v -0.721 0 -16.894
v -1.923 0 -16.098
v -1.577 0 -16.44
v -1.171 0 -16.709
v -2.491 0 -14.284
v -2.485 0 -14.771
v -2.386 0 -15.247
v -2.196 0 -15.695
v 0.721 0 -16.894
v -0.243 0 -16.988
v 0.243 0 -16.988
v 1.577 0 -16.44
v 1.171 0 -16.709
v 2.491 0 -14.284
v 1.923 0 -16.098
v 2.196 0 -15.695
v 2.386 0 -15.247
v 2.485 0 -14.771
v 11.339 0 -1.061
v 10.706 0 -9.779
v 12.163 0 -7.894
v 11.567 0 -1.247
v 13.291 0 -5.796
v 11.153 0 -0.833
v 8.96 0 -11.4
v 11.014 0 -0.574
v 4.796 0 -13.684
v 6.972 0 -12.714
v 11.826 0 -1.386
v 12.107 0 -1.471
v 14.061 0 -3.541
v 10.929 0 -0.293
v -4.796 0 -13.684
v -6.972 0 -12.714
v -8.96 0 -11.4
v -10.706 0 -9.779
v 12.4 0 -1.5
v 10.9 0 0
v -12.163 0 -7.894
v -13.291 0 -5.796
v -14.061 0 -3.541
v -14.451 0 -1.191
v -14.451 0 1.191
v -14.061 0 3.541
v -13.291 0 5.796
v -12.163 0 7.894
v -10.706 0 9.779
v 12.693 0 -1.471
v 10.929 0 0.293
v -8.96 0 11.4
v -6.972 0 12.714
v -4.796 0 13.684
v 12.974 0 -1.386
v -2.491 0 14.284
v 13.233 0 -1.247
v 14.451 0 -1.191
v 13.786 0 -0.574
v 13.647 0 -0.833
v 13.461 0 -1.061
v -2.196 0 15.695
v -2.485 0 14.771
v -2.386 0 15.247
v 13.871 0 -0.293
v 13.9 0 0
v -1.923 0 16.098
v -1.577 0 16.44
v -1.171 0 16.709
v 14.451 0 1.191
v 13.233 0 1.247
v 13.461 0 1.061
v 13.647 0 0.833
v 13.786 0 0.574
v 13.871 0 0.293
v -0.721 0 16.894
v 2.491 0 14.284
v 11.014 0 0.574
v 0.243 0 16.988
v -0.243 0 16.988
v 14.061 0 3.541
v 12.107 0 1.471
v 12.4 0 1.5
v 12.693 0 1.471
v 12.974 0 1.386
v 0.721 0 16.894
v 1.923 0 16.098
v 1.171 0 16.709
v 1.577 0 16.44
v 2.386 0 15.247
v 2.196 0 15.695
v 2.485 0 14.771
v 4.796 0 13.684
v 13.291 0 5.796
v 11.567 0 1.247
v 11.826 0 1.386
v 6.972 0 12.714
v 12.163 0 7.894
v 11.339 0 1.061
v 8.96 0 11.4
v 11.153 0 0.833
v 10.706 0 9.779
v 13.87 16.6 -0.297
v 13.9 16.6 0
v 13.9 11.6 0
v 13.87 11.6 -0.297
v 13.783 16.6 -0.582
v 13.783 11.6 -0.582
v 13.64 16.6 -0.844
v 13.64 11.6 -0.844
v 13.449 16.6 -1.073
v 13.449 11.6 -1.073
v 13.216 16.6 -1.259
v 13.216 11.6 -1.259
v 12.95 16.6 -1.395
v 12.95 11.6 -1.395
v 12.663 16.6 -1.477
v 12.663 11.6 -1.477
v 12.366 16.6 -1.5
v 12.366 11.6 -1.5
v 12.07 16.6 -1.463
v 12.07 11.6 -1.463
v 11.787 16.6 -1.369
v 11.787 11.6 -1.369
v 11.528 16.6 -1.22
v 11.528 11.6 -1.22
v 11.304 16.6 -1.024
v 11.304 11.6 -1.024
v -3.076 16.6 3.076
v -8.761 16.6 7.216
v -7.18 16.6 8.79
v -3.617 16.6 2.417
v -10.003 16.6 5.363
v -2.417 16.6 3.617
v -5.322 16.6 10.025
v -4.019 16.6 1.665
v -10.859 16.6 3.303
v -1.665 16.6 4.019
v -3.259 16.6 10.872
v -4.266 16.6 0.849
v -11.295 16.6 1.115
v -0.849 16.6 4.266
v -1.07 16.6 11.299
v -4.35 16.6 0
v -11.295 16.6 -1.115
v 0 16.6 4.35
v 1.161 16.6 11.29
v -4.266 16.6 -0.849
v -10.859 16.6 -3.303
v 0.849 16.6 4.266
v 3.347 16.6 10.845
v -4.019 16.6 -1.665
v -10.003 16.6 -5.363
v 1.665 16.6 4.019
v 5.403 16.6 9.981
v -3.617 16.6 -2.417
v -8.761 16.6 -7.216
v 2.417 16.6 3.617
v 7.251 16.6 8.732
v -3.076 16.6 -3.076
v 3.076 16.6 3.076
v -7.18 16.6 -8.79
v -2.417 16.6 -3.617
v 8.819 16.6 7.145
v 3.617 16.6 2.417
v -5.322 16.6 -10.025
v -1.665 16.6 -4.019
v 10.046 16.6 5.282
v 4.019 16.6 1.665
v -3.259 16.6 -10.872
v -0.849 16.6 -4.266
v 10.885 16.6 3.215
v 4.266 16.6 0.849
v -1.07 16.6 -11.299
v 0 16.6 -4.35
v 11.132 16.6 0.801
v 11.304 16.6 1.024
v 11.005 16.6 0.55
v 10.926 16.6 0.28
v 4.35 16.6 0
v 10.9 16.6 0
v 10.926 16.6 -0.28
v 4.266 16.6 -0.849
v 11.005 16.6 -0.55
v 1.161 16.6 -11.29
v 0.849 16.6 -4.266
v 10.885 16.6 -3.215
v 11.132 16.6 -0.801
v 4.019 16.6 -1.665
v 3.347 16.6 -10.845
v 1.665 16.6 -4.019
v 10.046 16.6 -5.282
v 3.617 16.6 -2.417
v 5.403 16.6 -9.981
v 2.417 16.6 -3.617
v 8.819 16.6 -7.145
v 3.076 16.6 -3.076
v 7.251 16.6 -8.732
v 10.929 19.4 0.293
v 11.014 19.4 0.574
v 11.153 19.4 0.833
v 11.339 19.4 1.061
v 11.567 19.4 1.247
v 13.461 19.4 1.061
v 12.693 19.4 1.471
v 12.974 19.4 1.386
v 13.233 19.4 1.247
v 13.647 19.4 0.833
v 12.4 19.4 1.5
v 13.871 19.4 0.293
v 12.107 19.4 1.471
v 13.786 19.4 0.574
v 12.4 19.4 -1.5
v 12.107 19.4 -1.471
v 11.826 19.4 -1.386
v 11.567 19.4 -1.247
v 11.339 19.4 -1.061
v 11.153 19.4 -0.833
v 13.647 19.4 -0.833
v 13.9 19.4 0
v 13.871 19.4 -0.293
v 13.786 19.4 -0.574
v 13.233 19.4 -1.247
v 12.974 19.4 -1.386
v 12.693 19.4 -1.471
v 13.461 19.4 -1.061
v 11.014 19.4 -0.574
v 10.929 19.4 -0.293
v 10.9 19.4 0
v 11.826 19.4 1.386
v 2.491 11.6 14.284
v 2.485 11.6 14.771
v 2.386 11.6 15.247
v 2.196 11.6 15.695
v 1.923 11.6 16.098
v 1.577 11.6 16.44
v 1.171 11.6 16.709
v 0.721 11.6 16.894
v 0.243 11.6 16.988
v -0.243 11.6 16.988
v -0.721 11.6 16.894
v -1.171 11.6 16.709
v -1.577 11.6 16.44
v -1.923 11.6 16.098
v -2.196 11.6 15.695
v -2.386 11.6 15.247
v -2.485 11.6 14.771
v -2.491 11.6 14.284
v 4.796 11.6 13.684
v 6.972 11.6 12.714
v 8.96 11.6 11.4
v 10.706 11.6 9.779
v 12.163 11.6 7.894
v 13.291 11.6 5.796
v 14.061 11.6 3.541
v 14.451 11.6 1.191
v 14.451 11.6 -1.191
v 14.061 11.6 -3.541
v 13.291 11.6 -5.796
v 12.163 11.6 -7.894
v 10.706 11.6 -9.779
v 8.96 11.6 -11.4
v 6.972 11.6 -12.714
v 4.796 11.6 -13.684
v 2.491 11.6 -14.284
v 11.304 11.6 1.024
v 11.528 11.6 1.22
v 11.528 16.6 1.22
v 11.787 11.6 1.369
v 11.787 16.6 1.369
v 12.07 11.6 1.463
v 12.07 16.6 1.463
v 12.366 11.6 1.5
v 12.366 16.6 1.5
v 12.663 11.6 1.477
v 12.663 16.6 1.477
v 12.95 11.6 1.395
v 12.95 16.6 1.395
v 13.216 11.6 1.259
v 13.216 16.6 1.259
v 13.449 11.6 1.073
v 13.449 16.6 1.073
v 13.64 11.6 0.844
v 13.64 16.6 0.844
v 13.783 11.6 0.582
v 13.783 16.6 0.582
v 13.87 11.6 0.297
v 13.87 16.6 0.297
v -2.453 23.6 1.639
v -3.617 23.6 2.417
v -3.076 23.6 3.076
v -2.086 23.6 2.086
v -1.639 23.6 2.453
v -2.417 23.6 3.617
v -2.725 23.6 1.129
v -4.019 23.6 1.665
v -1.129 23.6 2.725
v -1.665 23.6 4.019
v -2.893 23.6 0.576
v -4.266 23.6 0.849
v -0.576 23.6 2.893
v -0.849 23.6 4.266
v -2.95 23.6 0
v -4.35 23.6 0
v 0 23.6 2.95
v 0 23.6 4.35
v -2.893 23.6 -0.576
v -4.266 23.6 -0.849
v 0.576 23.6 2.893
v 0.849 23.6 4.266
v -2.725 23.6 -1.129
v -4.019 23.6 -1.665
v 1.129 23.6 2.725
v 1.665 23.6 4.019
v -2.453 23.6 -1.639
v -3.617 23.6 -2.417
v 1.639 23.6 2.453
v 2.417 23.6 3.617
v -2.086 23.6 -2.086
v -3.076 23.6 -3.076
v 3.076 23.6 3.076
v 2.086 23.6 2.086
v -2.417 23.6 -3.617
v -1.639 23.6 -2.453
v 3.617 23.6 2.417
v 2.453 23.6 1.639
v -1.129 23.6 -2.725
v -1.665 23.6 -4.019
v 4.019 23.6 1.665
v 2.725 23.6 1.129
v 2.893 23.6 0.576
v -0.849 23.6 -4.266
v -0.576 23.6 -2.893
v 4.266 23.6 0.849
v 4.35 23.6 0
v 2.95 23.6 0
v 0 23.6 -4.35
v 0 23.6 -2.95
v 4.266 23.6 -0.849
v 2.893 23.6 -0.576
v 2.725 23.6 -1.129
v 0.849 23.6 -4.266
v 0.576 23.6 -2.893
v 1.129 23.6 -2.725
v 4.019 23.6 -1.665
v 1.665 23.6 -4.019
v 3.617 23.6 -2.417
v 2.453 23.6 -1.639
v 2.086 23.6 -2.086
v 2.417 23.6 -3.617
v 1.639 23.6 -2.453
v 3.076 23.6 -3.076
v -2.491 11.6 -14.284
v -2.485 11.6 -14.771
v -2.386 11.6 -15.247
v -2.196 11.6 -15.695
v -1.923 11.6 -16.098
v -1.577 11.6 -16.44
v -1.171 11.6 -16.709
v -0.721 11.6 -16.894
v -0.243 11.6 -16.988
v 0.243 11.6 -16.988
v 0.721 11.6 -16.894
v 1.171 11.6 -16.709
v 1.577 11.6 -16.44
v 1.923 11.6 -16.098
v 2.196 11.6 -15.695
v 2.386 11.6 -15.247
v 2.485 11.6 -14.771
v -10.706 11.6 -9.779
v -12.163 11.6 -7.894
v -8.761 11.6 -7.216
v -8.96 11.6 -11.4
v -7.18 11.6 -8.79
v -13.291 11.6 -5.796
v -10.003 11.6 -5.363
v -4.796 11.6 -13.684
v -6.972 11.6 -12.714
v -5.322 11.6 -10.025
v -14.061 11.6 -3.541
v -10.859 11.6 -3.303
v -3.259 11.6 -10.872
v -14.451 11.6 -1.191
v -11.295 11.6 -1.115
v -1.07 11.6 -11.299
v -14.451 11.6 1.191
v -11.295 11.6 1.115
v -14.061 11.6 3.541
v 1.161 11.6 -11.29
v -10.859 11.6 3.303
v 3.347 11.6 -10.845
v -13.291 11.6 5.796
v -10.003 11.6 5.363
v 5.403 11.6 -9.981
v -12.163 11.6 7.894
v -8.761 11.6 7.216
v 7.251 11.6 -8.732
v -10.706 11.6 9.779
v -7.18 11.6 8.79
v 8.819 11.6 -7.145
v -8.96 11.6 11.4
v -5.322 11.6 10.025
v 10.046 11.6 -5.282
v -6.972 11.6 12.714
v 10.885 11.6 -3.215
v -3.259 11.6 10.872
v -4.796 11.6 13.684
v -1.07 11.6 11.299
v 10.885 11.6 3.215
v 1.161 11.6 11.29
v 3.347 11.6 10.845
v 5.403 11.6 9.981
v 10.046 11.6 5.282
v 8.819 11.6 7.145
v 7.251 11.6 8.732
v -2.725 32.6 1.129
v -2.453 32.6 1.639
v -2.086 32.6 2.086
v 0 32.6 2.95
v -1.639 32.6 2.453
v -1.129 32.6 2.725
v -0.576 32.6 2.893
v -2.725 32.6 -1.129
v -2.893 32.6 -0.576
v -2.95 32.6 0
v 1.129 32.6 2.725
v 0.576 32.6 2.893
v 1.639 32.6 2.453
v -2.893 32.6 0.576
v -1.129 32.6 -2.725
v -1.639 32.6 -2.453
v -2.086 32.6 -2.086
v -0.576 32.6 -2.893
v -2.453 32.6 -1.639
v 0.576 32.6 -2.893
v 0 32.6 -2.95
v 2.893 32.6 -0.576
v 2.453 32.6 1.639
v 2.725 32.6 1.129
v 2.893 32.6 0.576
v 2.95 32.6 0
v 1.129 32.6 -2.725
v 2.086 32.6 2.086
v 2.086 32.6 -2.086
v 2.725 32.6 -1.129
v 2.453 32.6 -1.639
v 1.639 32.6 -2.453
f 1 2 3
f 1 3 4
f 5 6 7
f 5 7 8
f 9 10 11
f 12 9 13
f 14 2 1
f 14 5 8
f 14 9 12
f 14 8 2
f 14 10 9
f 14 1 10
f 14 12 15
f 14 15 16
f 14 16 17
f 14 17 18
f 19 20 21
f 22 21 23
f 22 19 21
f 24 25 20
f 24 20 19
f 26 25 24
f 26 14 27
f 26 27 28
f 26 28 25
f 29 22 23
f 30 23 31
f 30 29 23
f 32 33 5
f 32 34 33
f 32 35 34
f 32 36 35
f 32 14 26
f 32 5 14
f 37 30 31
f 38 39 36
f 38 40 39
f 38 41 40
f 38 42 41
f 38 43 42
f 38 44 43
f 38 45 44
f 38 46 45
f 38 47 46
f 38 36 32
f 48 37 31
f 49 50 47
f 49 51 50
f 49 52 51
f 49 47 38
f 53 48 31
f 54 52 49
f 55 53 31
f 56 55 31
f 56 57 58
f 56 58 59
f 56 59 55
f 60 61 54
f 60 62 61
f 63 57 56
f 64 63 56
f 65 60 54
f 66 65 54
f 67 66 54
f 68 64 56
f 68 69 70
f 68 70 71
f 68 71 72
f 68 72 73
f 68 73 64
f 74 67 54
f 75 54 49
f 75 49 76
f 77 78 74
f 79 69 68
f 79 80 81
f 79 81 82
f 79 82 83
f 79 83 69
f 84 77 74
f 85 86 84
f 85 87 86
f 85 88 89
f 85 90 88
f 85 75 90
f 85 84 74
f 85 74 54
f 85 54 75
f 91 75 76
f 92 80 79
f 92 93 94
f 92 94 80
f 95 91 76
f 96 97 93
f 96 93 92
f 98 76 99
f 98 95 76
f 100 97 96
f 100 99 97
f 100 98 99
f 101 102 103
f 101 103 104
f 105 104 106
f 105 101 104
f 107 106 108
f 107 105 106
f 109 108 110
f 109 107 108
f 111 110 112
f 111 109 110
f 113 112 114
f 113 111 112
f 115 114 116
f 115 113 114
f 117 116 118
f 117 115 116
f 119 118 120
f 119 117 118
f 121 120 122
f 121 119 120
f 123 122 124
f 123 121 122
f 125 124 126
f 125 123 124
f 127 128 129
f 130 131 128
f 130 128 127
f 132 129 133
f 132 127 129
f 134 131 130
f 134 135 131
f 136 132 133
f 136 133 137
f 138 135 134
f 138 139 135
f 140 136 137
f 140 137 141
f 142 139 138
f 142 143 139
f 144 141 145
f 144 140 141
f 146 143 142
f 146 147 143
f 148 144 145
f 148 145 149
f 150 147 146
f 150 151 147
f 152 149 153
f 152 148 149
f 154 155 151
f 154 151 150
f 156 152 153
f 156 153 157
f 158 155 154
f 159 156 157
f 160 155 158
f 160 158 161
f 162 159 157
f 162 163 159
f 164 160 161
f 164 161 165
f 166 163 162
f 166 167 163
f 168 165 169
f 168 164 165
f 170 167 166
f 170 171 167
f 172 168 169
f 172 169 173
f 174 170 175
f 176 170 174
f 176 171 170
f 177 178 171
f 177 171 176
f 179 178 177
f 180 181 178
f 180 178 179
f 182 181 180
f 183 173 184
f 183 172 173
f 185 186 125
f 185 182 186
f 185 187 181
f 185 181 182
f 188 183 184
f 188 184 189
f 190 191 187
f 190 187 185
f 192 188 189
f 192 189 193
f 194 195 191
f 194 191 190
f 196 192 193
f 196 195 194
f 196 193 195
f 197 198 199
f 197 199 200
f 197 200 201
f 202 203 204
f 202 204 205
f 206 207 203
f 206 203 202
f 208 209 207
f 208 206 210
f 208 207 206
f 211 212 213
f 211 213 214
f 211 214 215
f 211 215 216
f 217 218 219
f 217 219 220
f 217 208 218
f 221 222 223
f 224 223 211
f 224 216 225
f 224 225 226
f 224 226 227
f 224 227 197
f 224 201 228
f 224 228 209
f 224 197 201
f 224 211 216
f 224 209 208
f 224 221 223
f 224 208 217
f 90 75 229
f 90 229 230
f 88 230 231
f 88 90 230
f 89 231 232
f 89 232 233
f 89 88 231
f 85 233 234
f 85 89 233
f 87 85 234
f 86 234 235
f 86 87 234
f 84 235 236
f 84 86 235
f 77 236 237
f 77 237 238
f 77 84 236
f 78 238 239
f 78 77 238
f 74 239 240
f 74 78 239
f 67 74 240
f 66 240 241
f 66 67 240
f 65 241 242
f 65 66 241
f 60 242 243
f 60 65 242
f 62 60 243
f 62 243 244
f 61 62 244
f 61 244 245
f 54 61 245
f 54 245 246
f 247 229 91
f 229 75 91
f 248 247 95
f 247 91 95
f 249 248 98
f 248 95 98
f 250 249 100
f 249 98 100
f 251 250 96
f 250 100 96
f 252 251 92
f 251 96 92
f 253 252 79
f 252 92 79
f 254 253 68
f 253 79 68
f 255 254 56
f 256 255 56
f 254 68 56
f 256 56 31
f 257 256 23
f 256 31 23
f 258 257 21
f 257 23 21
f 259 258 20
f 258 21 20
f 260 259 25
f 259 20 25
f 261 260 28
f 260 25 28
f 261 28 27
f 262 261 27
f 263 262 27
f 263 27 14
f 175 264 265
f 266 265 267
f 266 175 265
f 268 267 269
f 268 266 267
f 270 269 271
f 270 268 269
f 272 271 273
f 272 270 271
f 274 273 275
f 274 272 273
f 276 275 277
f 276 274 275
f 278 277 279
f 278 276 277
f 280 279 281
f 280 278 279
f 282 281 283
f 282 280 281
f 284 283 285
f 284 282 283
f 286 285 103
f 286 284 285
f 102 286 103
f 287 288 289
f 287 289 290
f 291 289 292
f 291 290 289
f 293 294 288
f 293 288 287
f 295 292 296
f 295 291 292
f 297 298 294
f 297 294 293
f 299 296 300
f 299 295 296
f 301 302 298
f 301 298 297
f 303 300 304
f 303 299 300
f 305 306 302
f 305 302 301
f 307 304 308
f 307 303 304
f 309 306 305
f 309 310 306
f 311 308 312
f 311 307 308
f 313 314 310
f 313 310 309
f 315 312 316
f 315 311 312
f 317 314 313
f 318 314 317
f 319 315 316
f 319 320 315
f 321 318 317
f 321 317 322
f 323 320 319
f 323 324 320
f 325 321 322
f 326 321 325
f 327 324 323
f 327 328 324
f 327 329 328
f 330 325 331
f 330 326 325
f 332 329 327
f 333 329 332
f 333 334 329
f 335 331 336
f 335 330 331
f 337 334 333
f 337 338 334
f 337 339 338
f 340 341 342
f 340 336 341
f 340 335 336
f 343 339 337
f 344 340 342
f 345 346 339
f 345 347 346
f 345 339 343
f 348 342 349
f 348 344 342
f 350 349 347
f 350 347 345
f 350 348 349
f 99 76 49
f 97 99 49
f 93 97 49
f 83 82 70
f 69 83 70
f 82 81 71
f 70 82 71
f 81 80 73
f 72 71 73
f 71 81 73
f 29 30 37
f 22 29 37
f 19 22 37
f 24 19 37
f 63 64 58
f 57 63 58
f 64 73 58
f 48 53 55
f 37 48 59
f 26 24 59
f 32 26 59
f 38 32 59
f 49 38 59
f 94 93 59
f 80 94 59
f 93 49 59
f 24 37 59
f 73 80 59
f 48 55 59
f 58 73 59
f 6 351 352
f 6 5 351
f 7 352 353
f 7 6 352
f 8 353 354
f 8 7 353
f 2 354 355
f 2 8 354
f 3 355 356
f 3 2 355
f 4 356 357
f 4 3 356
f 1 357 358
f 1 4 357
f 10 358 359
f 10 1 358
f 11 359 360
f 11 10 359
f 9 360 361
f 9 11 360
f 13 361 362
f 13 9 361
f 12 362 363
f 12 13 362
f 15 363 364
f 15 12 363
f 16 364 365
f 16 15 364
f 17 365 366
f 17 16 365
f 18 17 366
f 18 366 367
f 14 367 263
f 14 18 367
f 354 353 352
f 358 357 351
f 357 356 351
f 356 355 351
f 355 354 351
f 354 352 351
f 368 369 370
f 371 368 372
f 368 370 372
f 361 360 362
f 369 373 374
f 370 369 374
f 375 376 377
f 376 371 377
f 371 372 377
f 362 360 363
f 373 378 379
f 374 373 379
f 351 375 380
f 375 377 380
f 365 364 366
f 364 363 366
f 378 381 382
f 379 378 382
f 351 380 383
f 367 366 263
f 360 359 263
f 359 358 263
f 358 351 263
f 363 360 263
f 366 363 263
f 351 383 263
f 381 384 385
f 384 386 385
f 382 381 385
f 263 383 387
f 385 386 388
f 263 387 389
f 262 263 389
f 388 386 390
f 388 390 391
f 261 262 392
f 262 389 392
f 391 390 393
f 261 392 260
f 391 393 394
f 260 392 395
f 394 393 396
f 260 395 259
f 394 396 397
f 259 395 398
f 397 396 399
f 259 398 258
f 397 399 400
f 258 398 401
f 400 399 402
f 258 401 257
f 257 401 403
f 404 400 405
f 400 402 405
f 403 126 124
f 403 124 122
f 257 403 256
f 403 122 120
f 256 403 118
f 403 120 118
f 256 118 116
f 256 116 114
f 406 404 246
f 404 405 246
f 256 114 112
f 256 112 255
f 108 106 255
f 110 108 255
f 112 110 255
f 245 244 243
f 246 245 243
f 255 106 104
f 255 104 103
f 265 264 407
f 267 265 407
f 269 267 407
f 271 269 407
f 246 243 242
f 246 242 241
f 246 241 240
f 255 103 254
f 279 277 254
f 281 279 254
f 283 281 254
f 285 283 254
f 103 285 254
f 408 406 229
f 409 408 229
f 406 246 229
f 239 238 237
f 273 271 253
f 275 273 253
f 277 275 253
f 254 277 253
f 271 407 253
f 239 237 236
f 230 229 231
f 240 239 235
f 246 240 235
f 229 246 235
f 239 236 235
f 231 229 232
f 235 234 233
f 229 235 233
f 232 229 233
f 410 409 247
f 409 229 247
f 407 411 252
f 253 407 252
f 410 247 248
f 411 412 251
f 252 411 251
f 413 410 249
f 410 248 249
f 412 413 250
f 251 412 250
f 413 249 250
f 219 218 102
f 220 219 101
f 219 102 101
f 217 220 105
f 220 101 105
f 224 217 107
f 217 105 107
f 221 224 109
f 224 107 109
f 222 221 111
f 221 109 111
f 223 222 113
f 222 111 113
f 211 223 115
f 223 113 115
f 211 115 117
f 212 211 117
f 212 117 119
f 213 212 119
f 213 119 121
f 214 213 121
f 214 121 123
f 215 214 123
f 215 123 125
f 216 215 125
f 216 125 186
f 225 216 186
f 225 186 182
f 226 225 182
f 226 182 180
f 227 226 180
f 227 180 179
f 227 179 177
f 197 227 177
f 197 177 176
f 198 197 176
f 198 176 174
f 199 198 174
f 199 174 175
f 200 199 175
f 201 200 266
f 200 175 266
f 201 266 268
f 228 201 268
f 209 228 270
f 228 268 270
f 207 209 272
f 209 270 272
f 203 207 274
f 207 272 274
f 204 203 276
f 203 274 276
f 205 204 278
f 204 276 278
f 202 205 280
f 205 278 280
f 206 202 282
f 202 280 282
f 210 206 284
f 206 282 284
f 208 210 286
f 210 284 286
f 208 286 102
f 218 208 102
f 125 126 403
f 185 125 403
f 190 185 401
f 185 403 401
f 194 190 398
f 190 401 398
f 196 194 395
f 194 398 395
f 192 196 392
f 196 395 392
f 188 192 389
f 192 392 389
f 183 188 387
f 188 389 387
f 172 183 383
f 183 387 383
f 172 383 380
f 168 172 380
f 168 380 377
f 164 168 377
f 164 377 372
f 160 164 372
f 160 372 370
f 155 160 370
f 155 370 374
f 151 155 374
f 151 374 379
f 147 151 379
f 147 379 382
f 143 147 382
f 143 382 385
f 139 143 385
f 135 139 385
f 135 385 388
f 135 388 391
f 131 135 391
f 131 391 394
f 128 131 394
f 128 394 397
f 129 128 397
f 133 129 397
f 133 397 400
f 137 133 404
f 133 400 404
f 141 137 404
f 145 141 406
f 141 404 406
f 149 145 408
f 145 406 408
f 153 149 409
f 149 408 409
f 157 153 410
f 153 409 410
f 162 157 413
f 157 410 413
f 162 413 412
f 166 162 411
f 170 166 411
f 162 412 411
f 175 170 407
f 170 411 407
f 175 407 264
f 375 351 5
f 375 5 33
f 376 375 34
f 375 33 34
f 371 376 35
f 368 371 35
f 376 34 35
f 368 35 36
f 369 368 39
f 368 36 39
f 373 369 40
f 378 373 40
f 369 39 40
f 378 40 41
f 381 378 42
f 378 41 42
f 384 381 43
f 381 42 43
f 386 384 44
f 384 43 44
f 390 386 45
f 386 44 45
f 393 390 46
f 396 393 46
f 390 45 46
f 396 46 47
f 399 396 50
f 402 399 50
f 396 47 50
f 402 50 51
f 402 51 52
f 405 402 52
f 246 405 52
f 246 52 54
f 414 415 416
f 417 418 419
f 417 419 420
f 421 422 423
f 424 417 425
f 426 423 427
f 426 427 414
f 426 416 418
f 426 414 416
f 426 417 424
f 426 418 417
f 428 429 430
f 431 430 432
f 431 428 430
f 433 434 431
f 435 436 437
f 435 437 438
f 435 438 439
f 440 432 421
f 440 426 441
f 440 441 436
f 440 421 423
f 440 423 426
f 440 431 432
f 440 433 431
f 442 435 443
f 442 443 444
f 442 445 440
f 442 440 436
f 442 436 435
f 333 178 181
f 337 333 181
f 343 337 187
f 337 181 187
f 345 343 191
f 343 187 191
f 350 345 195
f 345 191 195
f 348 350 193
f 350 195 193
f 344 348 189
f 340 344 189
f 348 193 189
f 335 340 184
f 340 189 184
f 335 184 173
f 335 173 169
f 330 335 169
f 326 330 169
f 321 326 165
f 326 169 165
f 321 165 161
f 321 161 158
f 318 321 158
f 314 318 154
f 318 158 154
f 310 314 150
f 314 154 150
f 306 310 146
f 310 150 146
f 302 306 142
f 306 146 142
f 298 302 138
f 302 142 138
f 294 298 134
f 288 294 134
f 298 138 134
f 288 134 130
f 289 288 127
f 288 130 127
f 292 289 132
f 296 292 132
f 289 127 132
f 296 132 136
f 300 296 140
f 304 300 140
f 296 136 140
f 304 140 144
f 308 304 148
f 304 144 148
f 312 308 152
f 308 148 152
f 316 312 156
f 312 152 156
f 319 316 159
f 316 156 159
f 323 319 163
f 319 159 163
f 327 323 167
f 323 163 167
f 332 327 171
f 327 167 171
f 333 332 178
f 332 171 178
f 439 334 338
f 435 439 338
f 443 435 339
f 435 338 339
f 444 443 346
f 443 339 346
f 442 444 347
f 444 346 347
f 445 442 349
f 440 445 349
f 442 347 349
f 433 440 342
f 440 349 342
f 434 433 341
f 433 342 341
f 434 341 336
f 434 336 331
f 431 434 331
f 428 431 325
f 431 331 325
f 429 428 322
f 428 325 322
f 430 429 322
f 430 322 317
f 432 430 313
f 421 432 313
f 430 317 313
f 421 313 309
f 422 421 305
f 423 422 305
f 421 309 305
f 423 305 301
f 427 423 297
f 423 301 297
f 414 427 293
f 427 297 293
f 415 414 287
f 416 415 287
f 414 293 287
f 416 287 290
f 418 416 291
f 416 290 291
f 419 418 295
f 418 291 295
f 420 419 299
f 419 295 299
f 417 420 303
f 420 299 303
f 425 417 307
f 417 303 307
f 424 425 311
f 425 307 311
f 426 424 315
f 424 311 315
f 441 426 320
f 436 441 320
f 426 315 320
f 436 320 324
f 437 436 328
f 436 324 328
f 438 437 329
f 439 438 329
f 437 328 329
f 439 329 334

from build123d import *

# Parameters (mm, degrees)
SKETCH1_R                = 14.5
BOSS_EXTRUDE1_DEPTH      = 11.6
SKETCH2_R                = 11.35
BOSS_EXTRUDE2_DEPTH      = 5
SKETCH3_R                = 4.35
BOSS_EXTRUDE3_DEPTH      = 7
SKETCH4_R                = 2.95
BOSS_EXTRUDE4_DEPTH      = 9
SKETCH5_R                = 2.5
BOSS_EXTRUDE5_DEPTH      = 11.6
SKETCH6_R                = 1.5
BOSS_EXTRUDE6_DEPTH      = 2.8
BOSS_EXTRUDE6_DEPTH_BACK = 16.6


with BuildPart() as part:
    # Sketch1 → Boss-Extrude1 (new body)
    with BuildSketch(Plane(origin=(0, 0, 0), x_dir=(1, 0, 0), z_dir=(0, 1, 0))):
        Circle(SKETCH1_R)
    extrude(amount=BOSS_EXTRUDE1_DEPTH)

    # Sketch2 → Boss-Extrude2 (add)
    with BuildSketch(Plane(origin=(0, 11.6, 0), x_dir=(1, 0, 0), z_dir=(0, 1, 0))):
        Circle(SKETCH2_R)
    extrude(amount=BOSS_EXTRUDE2_DEPTH)

    # Sketch3 → Boss-Extrude3 (add)
    with BuildSketch(Plane(origin=(0, 16.6, 0), x_dir=(1, 0, 0), z_dir=(0, 1, 0))):
        Circle(SKETCH3_R)
    extrude(amount=BOSS_EXTRUDE3_DEPTH)

    # Sketch4 → Boss-Extrude4 (add)
    with BuildSketch(Plane(origin=(0, 23.6, 0), x_dir=(1, 0, 0), z_dir=(0, 1, 0))):
        Circle(SKETCH4_R)
    extrude(amount=BOSS_EXTRUDE4_DEPTH)

    # Sketch5 → Boss-Extrude5 (add)
    with BuildSketch(Plane.XZ):
        with Locations((0, 14.5)):
            Circle(SKETCH5_R)
        with Locations((0, -14.5)):
            Circle(SKETCH5_R)
    extrude(amount=-BOSS_EXTRUDE5_DEPTH)

    # Sketch6 → Boss-Extrude6 (add, two sides)
    with BuildSketch(Plane(origin=(0, 16.6, 0), x_dir=(1, 0, 0), z_dir=(0, 1, 0))) as boss_extrude6_sk:
        with Locations((12.4, 0)):
            Circle(SKETCH6_R)
    extrude(amount=BOSS_EXTRUDE6_DEPTH)
    extrude(boss_extrude6_sk.sketch, amount=-BOSS_EXTRUDE6_DEPTH_BACK)


solid = part.part
